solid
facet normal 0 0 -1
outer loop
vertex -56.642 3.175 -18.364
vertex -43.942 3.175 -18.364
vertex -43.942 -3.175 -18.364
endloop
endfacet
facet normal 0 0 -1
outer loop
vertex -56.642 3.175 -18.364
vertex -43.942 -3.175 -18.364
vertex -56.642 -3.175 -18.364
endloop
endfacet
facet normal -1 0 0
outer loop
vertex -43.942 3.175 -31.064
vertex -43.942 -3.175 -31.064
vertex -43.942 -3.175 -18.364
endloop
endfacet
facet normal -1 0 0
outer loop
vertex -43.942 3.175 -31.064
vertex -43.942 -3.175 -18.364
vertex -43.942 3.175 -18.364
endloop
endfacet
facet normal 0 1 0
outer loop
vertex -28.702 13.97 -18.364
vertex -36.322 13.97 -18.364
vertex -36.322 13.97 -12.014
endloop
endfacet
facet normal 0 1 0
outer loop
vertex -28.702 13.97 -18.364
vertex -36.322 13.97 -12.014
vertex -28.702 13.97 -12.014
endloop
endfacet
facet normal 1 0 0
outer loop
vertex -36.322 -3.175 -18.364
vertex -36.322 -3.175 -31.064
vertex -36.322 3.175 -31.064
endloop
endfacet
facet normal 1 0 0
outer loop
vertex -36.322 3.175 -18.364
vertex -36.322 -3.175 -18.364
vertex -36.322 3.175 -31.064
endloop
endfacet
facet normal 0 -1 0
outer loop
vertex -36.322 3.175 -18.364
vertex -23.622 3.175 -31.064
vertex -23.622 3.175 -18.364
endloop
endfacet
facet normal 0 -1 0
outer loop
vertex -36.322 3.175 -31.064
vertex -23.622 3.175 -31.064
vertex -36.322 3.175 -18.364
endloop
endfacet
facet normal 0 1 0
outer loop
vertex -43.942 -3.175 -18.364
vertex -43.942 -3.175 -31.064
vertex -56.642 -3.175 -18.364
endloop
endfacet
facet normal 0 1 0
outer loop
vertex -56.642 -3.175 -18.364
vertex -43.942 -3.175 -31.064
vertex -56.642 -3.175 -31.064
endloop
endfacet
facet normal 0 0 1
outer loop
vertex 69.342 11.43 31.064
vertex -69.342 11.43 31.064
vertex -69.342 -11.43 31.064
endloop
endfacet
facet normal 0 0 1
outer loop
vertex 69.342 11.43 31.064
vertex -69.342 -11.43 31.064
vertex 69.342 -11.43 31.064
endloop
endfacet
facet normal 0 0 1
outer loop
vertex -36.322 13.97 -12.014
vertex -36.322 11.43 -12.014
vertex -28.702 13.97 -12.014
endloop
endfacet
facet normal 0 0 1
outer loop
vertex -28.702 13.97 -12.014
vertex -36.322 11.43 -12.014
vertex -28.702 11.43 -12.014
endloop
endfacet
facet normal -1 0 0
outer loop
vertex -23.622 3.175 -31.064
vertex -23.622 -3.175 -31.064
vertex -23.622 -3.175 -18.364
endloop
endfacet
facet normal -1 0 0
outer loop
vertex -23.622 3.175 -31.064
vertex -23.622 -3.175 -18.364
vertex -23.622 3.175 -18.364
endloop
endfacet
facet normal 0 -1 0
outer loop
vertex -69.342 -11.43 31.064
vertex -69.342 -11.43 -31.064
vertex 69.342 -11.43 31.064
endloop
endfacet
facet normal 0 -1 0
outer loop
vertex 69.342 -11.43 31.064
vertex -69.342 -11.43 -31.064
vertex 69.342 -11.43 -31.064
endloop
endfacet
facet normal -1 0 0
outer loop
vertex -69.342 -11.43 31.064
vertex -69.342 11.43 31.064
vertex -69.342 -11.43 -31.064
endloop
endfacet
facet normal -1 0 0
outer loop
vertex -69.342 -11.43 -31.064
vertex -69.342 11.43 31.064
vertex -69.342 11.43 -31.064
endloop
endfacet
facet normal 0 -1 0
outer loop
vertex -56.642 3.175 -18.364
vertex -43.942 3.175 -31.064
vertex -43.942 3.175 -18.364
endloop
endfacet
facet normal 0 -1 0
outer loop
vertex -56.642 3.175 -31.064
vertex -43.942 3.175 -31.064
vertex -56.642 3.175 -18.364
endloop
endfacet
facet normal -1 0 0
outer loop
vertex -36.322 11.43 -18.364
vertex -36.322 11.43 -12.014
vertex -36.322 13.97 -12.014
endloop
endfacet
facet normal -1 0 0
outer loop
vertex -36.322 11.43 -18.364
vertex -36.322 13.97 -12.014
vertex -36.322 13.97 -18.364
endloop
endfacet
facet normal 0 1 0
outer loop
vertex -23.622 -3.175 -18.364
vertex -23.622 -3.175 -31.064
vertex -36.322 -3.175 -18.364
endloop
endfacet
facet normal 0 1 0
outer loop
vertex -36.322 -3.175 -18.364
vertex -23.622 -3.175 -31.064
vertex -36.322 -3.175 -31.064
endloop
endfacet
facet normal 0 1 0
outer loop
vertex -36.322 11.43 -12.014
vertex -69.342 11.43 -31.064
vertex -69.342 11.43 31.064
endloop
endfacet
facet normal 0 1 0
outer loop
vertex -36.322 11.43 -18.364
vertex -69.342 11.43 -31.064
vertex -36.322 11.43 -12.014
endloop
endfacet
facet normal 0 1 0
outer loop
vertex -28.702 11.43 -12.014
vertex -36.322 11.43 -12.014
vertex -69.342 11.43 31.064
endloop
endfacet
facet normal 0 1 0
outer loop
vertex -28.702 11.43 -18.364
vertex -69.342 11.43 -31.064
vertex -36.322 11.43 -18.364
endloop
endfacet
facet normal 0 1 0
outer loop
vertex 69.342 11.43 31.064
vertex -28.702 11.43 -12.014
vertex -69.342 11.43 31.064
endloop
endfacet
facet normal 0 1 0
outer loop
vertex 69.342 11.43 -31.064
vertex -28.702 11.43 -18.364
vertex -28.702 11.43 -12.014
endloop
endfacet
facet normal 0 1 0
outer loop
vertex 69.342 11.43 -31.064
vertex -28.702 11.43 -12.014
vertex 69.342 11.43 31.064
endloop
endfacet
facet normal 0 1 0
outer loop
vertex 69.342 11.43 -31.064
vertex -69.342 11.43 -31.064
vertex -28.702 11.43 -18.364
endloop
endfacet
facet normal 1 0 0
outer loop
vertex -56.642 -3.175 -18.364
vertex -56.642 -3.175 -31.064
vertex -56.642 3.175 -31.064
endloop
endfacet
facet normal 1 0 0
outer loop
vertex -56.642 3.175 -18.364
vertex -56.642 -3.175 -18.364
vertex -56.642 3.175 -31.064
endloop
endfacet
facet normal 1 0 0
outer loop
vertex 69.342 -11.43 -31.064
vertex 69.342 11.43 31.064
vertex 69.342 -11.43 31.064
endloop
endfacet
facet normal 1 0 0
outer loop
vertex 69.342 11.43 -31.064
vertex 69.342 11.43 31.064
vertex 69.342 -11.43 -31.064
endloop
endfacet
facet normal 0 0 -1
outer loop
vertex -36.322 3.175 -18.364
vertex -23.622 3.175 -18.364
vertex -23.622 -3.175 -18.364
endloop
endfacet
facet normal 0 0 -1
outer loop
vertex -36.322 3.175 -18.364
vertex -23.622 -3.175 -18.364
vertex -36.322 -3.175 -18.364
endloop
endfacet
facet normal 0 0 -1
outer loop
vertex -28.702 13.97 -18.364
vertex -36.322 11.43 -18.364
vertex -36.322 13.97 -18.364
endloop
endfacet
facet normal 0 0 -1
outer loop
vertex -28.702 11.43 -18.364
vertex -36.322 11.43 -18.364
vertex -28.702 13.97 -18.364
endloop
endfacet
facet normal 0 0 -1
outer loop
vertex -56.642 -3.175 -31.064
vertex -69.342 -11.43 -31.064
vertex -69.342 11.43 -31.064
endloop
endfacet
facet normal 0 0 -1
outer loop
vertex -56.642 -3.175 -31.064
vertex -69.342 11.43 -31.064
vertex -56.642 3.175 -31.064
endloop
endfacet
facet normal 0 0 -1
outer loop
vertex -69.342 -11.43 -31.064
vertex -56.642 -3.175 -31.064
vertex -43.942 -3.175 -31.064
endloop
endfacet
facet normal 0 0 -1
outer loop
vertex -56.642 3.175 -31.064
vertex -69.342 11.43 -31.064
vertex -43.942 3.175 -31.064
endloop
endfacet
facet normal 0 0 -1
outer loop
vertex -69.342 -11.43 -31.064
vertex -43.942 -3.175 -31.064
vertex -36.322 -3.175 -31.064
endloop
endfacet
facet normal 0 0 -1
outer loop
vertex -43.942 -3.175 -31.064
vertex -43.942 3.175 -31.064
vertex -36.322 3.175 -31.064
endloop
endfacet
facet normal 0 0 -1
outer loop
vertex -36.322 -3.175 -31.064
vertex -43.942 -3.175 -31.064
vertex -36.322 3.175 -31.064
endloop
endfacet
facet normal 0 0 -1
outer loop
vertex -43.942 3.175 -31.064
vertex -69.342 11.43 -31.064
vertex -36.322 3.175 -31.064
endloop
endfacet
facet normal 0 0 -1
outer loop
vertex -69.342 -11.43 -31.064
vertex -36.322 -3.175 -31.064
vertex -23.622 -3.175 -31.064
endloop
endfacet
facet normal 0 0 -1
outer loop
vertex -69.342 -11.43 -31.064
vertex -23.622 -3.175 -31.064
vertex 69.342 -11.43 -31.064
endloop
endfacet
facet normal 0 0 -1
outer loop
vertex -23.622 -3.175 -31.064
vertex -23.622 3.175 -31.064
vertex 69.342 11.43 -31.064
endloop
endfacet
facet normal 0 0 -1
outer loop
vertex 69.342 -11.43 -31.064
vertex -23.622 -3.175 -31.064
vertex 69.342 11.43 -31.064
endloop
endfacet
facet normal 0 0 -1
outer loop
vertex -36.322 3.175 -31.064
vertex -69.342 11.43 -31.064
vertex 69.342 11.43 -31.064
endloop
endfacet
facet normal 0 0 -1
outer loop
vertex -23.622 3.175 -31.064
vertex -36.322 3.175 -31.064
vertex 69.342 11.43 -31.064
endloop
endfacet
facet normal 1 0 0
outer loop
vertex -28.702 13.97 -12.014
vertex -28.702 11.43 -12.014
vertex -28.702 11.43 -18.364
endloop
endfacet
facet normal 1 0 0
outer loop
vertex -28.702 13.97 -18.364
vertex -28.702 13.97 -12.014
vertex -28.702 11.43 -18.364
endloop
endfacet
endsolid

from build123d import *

# Parameters (mm, degrees)
SKETCH1_W           = 138.684
SKETCH1_H           = 62.1284
BOSS_EXTRUDE1_DEPTH = 11.43
SKETCH3_W           = 12.7
SKETCH3_H           = 6.35
CUT_EXTRUDE1_DEPTH  = 12.7
SKETCH4_W           = 7.62
SKETCH4_H           = 6.35
BOSS_EXTRUDE2_DEPTH = 2.54


with BuildPart() as part:
    # Sketch1 → Boss-Extrude1 (new, symmetric)
    with BuildSketch(Plane(origin=(0, 0, 0), x_dir=(1, 0, 0), z_dir=(0, 1, 0))):
        Rectangle(SKETCH1_W, SKETCH1_H)
    extrude(amount=BOSS_EXTRUDE1_DEPTH, both=True)

    # Sketch3 → Cut-Extrude1 (cut)
    with BuildSketch(Plane(origin=(0, 0, -31.0642), x_dir=(-1, 0, 0), z_dir=(0, 0, -1))):
        with Locations((29.972, 0)):
            Rectangle(SKETCH3_W, SKETCH3_H)
        with Locations((50.292, 0)):
            Rectangle(SKETCH3_W, SKETCH3_H)
    extrude(amount=-CUT_EXTRUDE1_DEPTH, mode=Mode.SUBTRACT)

    # Sketch4 → Boss-Extrude2 (add)
    with BuildSketch(Plane(origin=(0, 11.43, 0), x_dir=(1, 0, 0), z_dir=(0, 1, 0))):
        with Locations((-32.512, 15.1892)):
            Rectangle(SKETCH4_W, SKETCH4_H)
    extrude(amount=BOSS_EXTRUDE2_DEPTH)


solid = part.part
